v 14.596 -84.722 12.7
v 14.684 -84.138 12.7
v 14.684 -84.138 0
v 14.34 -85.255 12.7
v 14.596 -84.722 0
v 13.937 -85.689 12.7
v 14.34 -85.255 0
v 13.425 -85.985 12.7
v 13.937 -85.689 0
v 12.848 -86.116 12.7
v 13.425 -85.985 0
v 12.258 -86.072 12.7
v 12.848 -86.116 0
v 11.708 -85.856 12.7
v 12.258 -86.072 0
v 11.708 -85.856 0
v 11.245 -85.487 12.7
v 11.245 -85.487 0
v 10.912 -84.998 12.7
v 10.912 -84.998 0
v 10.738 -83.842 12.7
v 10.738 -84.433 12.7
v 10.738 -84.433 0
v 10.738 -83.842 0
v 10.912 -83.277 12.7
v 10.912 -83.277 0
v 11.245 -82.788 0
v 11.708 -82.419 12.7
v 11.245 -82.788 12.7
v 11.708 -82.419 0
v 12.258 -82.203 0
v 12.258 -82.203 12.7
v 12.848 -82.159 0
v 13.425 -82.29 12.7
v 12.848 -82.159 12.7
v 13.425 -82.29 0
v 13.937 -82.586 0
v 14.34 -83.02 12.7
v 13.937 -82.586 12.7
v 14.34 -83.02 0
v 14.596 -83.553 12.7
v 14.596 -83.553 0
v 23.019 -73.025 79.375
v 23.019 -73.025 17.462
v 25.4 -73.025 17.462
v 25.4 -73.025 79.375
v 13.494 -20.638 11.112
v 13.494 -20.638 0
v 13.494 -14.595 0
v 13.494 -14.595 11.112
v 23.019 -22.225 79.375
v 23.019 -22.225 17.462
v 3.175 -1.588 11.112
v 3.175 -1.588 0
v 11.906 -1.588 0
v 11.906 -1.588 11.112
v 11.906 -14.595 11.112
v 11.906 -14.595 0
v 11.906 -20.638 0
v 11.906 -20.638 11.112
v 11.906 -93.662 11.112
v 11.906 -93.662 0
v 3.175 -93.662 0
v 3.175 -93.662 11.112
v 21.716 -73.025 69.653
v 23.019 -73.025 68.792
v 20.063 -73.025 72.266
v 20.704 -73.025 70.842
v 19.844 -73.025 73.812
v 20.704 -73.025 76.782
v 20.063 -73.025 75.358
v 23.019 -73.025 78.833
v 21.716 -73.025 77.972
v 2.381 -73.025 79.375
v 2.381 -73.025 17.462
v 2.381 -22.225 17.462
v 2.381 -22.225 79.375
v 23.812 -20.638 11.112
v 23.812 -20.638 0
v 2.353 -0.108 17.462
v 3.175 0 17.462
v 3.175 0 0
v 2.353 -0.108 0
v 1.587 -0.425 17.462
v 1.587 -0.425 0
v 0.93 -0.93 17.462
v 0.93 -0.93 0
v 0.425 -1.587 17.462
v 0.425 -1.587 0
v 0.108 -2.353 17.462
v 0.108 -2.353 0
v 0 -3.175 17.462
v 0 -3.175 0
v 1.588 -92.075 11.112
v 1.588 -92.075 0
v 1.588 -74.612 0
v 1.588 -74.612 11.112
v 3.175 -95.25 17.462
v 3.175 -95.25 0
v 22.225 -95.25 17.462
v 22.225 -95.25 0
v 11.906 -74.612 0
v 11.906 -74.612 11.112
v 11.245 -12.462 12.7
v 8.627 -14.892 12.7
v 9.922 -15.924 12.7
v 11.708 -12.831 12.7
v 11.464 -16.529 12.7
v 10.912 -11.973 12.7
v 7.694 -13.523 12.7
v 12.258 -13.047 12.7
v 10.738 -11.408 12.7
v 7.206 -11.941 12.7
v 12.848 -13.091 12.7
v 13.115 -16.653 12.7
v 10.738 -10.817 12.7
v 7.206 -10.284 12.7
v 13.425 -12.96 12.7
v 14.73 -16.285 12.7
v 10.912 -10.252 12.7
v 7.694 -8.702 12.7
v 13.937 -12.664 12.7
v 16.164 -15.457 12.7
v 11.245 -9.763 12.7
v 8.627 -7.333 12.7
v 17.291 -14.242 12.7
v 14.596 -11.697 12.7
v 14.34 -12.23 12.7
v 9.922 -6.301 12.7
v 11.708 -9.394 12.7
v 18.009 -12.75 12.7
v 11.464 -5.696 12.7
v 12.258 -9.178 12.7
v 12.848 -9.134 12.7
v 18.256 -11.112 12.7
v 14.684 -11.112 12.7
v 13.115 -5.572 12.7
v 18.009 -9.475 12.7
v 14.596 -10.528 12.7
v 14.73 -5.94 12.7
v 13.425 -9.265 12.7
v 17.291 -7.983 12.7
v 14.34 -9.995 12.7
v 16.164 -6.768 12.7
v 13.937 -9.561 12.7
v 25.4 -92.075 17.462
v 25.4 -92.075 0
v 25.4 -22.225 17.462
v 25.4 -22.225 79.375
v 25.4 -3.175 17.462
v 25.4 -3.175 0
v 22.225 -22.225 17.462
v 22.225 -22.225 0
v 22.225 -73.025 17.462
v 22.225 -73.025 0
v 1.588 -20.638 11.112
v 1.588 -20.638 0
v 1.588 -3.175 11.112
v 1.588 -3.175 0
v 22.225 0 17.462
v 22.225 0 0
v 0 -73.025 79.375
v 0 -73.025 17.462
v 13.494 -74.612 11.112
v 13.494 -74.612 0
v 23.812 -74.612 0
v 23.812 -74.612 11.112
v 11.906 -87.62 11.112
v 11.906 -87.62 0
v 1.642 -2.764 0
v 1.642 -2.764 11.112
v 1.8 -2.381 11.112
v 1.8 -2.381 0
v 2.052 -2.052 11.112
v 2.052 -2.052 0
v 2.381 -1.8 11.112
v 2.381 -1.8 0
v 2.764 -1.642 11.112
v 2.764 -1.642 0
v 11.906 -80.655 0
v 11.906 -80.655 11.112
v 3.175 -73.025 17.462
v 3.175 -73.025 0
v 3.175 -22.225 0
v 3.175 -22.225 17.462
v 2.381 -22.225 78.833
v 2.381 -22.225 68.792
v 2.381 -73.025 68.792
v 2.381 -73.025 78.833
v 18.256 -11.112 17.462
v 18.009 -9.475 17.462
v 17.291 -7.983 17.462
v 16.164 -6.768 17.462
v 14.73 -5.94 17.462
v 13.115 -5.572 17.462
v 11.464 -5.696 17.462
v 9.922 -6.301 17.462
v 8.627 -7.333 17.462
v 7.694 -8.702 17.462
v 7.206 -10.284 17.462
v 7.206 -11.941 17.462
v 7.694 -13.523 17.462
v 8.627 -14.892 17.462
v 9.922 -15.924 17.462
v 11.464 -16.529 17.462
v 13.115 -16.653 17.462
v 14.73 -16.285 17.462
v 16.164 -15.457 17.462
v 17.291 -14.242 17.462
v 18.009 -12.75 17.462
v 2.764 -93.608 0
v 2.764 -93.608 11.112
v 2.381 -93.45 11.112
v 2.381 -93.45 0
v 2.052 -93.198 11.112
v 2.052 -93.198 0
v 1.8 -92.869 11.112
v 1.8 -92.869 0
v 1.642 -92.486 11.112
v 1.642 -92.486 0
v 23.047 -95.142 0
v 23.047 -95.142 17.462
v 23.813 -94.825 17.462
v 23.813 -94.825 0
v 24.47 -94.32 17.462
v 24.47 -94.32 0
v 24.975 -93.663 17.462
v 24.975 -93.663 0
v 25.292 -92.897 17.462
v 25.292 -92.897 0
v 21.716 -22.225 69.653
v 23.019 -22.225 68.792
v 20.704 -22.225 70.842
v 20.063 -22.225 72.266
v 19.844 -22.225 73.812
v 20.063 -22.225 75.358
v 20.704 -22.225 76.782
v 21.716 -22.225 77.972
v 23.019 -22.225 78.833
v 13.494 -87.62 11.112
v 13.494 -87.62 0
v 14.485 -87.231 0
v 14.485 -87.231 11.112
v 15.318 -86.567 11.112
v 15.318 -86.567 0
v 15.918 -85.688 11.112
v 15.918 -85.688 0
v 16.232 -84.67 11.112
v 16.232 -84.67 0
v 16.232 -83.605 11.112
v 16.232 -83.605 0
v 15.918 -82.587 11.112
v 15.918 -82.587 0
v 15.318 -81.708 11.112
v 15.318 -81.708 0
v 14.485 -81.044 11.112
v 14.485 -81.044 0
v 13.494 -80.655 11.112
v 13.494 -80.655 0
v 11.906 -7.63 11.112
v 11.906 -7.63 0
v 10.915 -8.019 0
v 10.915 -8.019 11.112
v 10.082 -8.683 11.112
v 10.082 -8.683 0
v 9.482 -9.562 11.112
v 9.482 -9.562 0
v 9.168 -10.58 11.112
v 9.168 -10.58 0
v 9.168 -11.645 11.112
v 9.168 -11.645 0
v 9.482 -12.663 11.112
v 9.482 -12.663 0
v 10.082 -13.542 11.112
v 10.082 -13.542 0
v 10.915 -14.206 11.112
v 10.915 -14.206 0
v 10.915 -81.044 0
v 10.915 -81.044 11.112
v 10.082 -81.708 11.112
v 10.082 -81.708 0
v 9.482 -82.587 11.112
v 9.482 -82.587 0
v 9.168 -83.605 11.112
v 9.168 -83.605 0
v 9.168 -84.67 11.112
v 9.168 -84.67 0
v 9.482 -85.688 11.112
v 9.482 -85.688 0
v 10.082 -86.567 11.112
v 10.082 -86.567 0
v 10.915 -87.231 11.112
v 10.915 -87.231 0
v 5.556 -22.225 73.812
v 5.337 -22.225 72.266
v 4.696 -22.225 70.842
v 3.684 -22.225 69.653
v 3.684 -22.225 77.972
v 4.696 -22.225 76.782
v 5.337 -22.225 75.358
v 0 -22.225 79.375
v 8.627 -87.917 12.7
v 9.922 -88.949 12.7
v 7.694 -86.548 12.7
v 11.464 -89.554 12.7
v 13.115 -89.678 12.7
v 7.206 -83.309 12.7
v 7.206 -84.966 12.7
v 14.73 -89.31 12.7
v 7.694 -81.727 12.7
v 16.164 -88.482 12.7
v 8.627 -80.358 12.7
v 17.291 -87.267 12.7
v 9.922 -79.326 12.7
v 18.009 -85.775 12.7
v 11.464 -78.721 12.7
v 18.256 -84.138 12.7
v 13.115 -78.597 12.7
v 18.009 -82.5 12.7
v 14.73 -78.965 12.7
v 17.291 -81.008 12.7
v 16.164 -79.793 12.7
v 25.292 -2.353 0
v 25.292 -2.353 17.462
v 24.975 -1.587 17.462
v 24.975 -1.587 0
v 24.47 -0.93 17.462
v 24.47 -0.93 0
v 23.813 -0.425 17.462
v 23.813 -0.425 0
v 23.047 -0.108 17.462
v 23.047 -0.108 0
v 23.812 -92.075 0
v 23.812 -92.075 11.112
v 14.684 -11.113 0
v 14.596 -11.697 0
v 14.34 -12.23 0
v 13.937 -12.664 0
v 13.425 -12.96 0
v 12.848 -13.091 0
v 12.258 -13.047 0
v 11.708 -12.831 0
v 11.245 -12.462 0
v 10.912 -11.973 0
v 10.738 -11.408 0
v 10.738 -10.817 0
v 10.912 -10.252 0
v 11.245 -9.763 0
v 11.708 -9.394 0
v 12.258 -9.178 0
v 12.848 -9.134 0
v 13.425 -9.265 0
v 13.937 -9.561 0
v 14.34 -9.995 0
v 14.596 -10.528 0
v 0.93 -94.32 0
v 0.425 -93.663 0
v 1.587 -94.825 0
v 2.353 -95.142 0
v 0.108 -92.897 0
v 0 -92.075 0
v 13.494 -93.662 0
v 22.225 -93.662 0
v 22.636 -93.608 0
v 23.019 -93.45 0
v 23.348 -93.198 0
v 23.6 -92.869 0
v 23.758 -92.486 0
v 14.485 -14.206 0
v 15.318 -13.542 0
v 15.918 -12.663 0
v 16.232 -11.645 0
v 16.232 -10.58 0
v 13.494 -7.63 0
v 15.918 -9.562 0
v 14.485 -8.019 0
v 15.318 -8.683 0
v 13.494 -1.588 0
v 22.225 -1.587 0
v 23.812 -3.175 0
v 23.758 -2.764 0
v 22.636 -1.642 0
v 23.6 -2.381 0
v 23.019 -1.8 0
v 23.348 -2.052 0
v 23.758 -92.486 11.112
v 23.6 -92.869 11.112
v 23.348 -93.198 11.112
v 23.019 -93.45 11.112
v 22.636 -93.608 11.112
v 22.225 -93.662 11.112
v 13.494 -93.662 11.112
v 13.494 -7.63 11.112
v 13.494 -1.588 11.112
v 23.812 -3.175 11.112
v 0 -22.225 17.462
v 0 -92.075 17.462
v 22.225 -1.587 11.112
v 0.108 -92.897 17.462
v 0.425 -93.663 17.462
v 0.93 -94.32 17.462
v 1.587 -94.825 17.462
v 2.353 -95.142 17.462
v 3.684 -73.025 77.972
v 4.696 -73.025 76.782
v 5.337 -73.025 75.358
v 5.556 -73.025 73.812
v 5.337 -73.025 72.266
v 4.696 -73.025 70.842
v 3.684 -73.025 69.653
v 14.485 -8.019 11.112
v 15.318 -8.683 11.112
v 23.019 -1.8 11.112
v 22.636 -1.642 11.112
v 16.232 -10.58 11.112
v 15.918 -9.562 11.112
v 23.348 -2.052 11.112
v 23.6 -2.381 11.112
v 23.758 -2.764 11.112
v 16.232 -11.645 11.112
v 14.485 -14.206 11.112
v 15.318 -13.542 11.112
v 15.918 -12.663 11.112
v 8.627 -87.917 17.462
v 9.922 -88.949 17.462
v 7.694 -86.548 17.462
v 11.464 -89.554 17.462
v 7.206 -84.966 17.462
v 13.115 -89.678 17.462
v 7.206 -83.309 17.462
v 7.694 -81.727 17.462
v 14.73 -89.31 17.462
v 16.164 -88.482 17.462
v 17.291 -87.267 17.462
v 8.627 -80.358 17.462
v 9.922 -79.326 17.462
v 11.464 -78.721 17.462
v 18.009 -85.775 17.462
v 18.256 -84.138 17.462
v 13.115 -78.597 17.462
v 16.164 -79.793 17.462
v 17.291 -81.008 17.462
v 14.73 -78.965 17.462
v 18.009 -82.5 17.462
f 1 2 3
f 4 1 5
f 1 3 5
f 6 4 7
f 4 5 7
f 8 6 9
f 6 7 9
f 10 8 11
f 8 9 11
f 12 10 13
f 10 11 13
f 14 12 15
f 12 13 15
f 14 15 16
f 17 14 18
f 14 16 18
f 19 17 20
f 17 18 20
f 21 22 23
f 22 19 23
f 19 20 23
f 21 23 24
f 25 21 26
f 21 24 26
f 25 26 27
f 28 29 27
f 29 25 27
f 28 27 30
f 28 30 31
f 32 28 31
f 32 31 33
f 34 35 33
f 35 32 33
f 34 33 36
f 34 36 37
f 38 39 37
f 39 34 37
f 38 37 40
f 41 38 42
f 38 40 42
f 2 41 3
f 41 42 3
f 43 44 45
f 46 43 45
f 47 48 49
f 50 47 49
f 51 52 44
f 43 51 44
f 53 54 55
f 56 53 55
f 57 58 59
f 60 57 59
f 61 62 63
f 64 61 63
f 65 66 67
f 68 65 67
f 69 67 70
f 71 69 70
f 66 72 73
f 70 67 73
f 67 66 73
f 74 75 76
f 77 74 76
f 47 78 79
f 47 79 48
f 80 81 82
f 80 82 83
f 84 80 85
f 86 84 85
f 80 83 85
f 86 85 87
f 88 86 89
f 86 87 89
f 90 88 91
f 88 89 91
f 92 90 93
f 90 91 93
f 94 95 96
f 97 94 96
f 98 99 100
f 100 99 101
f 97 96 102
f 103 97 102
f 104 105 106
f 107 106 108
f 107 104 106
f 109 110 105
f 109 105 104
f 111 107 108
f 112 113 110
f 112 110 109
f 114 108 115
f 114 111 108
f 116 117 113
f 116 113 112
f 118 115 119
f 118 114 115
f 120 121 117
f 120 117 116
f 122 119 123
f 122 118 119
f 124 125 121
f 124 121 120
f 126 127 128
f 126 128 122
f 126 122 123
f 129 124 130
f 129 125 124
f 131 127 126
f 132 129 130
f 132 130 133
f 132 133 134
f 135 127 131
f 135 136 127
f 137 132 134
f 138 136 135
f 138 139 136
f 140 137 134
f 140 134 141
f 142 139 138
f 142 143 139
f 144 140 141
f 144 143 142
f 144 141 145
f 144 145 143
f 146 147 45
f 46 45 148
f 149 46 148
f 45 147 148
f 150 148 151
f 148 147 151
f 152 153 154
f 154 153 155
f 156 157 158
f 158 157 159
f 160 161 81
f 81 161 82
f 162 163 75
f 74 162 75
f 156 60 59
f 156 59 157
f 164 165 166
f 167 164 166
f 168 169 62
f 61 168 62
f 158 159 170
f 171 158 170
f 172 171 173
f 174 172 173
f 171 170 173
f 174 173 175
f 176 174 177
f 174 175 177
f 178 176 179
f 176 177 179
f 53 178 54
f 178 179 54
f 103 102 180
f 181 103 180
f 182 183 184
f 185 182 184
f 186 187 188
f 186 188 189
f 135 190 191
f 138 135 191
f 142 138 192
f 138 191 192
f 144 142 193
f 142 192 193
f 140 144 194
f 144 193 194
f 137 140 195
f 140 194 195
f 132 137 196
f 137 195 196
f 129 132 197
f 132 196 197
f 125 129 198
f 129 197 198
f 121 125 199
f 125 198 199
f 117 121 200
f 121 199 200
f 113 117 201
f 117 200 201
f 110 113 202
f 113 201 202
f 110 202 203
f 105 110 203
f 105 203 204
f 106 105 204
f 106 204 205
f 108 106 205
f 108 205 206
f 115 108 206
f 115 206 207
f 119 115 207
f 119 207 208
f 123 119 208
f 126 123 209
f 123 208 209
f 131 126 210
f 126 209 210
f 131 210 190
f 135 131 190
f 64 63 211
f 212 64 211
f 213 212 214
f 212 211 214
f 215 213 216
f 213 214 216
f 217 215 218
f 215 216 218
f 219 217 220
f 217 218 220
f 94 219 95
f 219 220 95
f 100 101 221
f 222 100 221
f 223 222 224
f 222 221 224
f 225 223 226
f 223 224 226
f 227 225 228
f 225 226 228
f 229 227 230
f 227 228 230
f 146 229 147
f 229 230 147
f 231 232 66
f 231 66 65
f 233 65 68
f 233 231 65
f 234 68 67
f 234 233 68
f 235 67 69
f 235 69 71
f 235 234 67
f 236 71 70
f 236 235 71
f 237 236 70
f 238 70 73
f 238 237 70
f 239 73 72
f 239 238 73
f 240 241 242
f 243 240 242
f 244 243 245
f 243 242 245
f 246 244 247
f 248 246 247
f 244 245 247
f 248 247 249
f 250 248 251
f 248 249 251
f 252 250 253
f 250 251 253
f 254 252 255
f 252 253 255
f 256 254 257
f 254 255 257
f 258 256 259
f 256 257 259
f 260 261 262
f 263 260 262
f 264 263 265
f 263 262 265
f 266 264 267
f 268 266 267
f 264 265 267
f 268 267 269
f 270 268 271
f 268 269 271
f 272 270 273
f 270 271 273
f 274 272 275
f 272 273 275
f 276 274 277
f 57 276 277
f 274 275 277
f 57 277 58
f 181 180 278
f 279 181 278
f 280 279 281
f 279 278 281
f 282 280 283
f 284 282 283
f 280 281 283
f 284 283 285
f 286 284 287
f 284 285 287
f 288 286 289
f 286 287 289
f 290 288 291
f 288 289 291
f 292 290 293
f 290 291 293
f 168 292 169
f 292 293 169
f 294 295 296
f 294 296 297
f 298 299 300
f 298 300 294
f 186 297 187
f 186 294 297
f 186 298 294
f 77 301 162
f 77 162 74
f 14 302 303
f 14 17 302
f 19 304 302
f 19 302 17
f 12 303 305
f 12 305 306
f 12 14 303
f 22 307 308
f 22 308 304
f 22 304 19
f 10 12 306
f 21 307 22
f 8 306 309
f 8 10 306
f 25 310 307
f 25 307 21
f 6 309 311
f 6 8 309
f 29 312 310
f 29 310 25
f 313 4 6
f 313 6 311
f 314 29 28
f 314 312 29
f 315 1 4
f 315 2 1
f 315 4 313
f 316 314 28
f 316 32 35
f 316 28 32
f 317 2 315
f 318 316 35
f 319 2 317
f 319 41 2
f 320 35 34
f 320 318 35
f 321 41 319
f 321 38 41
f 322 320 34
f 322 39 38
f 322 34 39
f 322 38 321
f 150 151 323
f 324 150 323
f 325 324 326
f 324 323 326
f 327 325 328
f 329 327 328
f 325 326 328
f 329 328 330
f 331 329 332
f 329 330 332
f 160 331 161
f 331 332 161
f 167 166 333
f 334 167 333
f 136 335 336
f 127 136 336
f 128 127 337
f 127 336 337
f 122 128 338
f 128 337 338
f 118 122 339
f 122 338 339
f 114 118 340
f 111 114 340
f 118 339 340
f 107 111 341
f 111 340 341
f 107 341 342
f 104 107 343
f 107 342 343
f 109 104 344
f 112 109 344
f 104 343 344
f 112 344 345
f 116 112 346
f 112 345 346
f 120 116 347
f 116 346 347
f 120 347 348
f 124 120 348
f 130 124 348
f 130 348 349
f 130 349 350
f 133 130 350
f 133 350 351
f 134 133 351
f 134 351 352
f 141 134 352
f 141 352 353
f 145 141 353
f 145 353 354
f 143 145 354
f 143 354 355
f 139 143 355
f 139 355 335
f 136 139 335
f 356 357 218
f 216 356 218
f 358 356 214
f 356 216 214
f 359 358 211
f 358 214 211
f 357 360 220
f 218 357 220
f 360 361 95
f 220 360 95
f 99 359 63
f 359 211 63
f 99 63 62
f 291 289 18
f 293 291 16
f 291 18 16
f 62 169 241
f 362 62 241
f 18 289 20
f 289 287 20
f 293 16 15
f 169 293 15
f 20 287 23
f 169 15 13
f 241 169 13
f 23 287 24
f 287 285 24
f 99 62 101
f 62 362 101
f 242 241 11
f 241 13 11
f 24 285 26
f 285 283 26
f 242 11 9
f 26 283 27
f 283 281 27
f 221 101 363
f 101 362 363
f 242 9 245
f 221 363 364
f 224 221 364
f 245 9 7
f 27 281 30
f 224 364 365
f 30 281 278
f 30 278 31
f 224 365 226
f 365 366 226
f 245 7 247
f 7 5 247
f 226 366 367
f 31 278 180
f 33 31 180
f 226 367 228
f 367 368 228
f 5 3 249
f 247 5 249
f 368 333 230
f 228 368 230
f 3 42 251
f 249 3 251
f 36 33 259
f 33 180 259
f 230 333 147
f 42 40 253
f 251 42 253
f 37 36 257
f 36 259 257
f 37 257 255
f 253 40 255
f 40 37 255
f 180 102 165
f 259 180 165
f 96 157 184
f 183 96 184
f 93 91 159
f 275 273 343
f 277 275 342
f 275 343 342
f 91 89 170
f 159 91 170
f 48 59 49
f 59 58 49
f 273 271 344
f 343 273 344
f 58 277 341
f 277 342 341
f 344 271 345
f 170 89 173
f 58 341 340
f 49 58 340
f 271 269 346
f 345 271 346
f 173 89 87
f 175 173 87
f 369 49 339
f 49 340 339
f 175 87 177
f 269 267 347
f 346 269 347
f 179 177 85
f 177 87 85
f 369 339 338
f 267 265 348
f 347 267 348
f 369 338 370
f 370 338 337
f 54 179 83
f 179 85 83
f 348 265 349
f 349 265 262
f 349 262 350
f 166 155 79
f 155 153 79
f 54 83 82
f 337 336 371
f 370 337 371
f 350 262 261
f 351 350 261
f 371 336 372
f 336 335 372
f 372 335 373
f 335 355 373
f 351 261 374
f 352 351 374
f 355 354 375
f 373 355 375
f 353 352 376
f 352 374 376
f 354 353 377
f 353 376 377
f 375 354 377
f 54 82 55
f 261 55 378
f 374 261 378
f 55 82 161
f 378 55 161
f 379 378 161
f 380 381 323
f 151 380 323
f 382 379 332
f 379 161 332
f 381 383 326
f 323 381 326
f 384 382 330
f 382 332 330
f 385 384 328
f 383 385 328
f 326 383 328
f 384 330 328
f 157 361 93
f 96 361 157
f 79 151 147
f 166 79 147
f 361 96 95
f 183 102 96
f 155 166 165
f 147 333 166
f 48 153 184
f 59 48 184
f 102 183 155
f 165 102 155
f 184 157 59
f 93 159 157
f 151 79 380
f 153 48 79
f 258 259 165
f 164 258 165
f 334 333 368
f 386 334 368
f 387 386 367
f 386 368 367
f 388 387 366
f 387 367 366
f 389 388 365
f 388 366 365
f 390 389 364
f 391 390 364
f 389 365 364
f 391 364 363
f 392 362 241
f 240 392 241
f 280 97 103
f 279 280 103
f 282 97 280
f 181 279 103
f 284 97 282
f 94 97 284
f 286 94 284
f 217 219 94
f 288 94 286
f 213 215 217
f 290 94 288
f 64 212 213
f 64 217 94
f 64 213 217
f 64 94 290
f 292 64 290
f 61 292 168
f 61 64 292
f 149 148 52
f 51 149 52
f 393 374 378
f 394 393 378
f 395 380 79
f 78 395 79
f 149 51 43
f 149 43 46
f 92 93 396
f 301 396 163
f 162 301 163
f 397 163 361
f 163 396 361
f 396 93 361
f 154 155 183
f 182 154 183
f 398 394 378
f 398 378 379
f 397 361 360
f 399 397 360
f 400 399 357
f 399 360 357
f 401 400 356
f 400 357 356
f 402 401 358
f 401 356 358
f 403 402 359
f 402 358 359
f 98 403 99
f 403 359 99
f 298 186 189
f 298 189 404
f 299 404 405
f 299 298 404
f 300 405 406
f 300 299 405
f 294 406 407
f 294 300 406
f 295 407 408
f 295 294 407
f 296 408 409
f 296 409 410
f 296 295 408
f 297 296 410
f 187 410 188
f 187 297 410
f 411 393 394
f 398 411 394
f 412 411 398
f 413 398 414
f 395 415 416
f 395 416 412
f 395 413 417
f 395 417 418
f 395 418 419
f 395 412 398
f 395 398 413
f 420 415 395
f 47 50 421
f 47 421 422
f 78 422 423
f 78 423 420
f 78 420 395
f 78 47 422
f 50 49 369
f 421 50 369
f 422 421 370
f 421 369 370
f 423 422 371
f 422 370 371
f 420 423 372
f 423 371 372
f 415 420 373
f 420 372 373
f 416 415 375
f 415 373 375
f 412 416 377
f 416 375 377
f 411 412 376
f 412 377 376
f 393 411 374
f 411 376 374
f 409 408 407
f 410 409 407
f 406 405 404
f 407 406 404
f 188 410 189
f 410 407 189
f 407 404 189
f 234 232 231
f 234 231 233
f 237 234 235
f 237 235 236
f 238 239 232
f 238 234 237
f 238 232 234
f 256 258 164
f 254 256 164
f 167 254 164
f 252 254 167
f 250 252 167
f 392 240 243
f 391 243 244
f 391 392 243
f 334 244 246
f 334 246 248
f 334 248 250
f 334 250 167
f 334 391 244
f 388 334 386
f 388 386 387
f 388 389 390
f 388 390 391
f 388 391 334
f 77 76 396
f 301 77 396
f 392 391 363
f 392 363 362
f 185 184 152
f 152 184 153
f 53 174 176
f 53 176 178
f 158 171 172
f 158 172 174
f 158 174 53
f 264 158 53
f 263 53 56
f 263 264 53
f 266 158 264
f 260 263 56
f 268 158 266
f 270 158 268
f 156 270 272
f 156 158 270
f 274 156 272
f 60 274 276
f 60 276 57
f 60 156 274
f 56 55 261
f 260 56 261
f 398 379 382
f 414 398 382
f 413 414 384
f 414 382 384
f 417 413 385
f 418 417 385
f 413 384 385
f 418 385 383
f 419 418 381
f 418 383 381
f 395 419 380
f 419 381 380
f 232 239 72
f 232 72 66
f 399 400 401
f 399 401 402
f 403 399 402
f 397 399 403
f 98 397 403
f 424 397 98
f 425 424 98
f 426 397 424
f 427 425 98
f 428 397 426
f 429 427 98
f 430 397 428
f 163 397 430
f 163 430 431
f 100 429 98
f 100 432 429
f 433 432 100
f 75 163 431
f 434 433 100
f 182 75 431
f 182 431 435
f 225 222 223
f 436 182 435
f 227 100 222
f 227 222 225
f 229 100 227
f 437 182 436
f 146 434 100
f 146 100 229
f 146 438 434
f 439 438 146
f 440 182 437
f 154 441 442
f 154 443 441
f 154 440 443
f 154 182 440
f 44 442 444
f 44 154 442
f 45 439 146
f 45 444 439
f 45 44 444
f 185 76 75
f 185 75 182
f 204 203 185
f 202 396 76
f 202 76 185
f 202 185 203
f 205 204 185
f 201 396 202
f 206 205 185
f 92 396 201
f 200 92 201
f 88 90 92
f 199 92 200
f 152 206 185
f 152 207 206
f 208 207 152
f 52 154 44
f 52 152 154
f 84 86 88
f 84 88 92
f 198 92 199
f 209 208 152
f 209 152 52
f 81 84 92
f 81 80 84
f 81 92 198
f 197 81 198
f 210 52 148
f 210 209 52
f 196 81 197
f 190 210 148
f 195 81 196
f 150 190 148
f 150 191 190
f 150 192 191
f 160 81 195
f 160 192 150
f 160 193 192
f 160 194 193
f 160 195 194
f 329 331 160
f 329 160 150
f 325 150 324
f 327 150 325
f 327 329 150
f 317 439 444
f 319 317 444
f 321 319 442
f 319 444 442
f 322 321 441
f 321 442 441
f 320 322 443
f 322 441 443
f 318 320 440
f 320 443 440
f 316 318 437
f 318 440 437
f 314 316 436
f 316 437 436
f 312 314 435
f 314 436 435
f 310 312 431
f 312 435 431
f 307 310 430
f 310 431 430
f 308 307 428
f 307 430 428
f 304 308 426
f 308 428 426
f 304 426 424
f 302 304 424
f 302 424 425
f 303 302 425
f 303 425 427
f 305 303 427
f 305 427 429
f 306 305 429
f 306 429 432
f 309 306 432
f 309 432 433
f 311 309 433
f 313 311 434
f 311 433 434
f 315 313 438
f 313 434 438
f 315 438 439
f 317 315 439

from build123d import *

# Parameters (mm, degrees)
F1_DEPTH  = 17.4625
F3_DEPTH  = 61.9125
F4_R      = 1.984375
F5_DEPTH  = 79.376
F7_DEPTH  = 50.8
F8_DEPTH  = 3.175
F9_R      = 1.984375
F10_DEPTH = 11.1125
F11_R     = 5.55625
F11_R_2   = 1.984375
F12_DEPTH = 4.7625


with BuildPart() as f1:
    # F0 (on Top) → F1 (new body)
    with BuildSketch(Plane.XY):
        with BuildLine():
            Line((22.225, 0), (3.175, 0))
            ThreePointArc((3.175, 0), (0.9299359697, -0.9299359697), (0, -3.175))
            Line((0, -3.175), (0, -92.075))
            ThreePointArc((0, -92.075), (0.9299359697, -94.3200640303), (3.175, -95.25))
            Line((3.175, -95.25), (22.225, -95.25))
            ThreePointArc((22.225, -95.25), (24.4700640303, -94.3200640303), (25.4, -92.075))
            Line((25.4, -92.075), (25.4, -3.175))
            ThreePointArc((25.4, -3.175), (24.4700640303, -0.9299359697), (22.225, 0))
        make_face()
        Polygon((3.175, -22.225), (12.7, -22.225), (22.225, -22.225), (22.225, -47.625), (22.225, -73.025), (12.7, -73.025), (3.175, -73.025), (3.175, -47.625), align=None, mode=Mode.SUBTRACT)
    extrude(amount=F1_DEPTH)

    # F2 (on face) → F3 (join)
    with BuildSketch(Plane.XY.offset(17.4625)):
        Polygon((2.38125, -47.625), (2.38125, -22.225), (0, -22.225), (0, -47.625), (0, -73.025), (2.38125, -73.025), align=None)
        Polygon((25.4, -47.625), (25.4, -22.225), (23.01875, -22.225), (23.01875, -47.625), (23.01875, -73.025), (25.4, -73.025), align=None)
    extrude(amount=F3_DEPTH)

    # F4 (on face) → F5 (cut, through all)
    with BuildSketch(Plane(origin=(0, 0, 0), x_dir=(1, 0, 0), z_dir=(0, 0, -1))):
        with Locations((12.7, 11.1125)):
            Circle(F4_R)
        with Locations((12.7, 84.1375)):
            Circle(F4_R)
    extrude(amount=-F5_DEPTH, mode=Mode.SUBTRACT)

    # F0 (on Top) → F8 (cut)
    with BuildSketch(Plane.XY):
        Polygon((22.225, -22.225), (12.7, -22.225), (3.175, -22.225), (3.175, -47.625), (3.175, -73.025), (12.7, -73.025), (22.225, -73.025), (22.225, -47.625), align=None)
    extrude(amount=F8_DEPTH, mode=Mode.SUBTRACT)

    # F9 (on face) → F10 (cut)
    with BuildSketch(Plane(origin=(0, 0, 0), x_dir=(1, 0, 0), z_dir=(0, 0, -1))):
        with Locations((12.7, 11.1125)):
            Circle(F9_R)
        with Locations((12.7, 84.1375)):
            Circle(F9_R)
        with BuildLine():
            Line((23.8125, 3.175), (23.8125, 20.6375))
            Line((23.8125, 20.6375), (13.49375, 20.6375))
            Line((13.49375, 20.6375), (13.49375, 14.5950639912))
            ThreePointArc((13.49375, 14.5950639912), (16.271875, 11.1125), (13.49375, 7.6299360088))
            Line((13.49375, 7.6299360088), (13.49375, 1.5875))
            Line((13.49375, 1.5875), (22.225, 1.5875))
            ThreePointArc((22.225, 1.5875), (23.3475320151, 2.0524679849), (23.8125, 3.175))
        make_face()
        with BuildLine():
            Line((22.225, 93.6625), (13.49375, 93.6625))
            Line((13.49375, 93.6625), (13.49375, 87.6200639912))
            ThreePointArc((13.49375, 87.6200639912), (16.271875, 84.1375), (13.49375, 80.6549360088))
            Line((13.49375, 80.6549360088), (13.49375, 74.6125))
            Line((13.49375, 74.6125), (23.8125, 74.6125))
            Line((23.8125, 74.6125), (23.8125, 92.075))
            ThreePointArc((23.8125, 92.075), (23.3475320151, 93.1975320151), (22.225, 93.6625))
        make_face()
        with BuildLine():
            ThreePointArc((11.90625, 80.6549360088), (9.128125, 84.1375), (11.90625, 87.6200639912))
            Line((11.90625, 87.6200639912), (11.90625, 93.6625))
            Line((11.90625, 93.6625), (3.175, 93.6625))
            ThreePointArc((3.175, 93.6625), (2.0524679849, 93.1975320151), (1.5875, 92.075))
            Line((1.5875, 92.075), (1.5875, 74.6125))
            Line((1.5875, 74.6125), (11.90625, 74.6125))
            Line((11.90625, 74.6125), (11.90625, 80.6549360088))
        make_face()
        with BuildLine():
            Line((11.90625, 20.6375), (1.5875, 20.6375))
            Line((1.5875, 20.6375), (1.5875, 3.175))
            ThreePointArc((1.5875, 3.175), (2.0524679849, 2.0524679849), (3.175, 1.5875))
            Line((3.175, 1.5875), (11.90625, 1.5875))
            Line((11.90625, 1.5875), (11.90625, 7.6299360088))
            ThreePointArc((11.90625, 7.6299360088), (9.128125, 11.1125), (11.90625, 14.5950639912))
            Line((11.90625, 14.5950639912), (11.90625, 20.6375))
        make_face()
    extrude(amount=-F10_DEPTH, mode=Mode.SUBTRACT)

    # F11 (on face) → F12 (cut)
    with BuildSketch(Plane.XY.offset(17.4625)):
        with Locations((12.7, -84.1375)):
            Circle(F11_R)
        with Locations((12.7, -84.1375)):
            Circle(F11_R_2, mode=Mode.SUBTRACT)
        with Locations((12.7, -11.1125)):
            Circle(F11_R)
        with Locations((12.7, -11.1125)):
            Circle(F11_R_2, mode=Mode.SUBTRACT)
        with Locations((12.7, -11.1125)):
            Circle(F11_R_2)
    extrude(amount=-F12_DEPTH, mode=Mode.SUBTRACT)


with BuildPart() as f7:
    # F6 (on face) → F7 (new body)
    with BuildSketch(Plane(origin=(0, -22.225, 0), x_dir=(-1, 0, 0), z_dir=(0, 1, 0))):
        with BuildLine():
            ThreePointArc((-23.01875, 68.7922842145), (-19.84375, 73.8124), (-23.01875, 78.8325157855))
            Line((-23.01875, 78.8325157855), (-23.01875, 68.7922842145))
        make_face()
    extrude(amount=-F7_DEPTH)


with BuildPart() as f7b:
    # F6 (on face) → F7, piece 2 (new body)
    with BuildSketch(Plane(origin=(0, -22.225, 0), x_dir=(-1, 0, 0), z_dir=(0, 1, 0))):
        with BuildLine():
            Line((-2.38125, 68.7922842145), (-2.38125, 78.8325157855))
            ThreePointArc((-2.38125, 78.8325157855), (-5.55625, 73.8124), (-2.38125, 68.7922842145))
        make_face()
    extrude(amount=-F7_DEPTH)


solid = Compound([f1.part, f7.part, f7b.part])
